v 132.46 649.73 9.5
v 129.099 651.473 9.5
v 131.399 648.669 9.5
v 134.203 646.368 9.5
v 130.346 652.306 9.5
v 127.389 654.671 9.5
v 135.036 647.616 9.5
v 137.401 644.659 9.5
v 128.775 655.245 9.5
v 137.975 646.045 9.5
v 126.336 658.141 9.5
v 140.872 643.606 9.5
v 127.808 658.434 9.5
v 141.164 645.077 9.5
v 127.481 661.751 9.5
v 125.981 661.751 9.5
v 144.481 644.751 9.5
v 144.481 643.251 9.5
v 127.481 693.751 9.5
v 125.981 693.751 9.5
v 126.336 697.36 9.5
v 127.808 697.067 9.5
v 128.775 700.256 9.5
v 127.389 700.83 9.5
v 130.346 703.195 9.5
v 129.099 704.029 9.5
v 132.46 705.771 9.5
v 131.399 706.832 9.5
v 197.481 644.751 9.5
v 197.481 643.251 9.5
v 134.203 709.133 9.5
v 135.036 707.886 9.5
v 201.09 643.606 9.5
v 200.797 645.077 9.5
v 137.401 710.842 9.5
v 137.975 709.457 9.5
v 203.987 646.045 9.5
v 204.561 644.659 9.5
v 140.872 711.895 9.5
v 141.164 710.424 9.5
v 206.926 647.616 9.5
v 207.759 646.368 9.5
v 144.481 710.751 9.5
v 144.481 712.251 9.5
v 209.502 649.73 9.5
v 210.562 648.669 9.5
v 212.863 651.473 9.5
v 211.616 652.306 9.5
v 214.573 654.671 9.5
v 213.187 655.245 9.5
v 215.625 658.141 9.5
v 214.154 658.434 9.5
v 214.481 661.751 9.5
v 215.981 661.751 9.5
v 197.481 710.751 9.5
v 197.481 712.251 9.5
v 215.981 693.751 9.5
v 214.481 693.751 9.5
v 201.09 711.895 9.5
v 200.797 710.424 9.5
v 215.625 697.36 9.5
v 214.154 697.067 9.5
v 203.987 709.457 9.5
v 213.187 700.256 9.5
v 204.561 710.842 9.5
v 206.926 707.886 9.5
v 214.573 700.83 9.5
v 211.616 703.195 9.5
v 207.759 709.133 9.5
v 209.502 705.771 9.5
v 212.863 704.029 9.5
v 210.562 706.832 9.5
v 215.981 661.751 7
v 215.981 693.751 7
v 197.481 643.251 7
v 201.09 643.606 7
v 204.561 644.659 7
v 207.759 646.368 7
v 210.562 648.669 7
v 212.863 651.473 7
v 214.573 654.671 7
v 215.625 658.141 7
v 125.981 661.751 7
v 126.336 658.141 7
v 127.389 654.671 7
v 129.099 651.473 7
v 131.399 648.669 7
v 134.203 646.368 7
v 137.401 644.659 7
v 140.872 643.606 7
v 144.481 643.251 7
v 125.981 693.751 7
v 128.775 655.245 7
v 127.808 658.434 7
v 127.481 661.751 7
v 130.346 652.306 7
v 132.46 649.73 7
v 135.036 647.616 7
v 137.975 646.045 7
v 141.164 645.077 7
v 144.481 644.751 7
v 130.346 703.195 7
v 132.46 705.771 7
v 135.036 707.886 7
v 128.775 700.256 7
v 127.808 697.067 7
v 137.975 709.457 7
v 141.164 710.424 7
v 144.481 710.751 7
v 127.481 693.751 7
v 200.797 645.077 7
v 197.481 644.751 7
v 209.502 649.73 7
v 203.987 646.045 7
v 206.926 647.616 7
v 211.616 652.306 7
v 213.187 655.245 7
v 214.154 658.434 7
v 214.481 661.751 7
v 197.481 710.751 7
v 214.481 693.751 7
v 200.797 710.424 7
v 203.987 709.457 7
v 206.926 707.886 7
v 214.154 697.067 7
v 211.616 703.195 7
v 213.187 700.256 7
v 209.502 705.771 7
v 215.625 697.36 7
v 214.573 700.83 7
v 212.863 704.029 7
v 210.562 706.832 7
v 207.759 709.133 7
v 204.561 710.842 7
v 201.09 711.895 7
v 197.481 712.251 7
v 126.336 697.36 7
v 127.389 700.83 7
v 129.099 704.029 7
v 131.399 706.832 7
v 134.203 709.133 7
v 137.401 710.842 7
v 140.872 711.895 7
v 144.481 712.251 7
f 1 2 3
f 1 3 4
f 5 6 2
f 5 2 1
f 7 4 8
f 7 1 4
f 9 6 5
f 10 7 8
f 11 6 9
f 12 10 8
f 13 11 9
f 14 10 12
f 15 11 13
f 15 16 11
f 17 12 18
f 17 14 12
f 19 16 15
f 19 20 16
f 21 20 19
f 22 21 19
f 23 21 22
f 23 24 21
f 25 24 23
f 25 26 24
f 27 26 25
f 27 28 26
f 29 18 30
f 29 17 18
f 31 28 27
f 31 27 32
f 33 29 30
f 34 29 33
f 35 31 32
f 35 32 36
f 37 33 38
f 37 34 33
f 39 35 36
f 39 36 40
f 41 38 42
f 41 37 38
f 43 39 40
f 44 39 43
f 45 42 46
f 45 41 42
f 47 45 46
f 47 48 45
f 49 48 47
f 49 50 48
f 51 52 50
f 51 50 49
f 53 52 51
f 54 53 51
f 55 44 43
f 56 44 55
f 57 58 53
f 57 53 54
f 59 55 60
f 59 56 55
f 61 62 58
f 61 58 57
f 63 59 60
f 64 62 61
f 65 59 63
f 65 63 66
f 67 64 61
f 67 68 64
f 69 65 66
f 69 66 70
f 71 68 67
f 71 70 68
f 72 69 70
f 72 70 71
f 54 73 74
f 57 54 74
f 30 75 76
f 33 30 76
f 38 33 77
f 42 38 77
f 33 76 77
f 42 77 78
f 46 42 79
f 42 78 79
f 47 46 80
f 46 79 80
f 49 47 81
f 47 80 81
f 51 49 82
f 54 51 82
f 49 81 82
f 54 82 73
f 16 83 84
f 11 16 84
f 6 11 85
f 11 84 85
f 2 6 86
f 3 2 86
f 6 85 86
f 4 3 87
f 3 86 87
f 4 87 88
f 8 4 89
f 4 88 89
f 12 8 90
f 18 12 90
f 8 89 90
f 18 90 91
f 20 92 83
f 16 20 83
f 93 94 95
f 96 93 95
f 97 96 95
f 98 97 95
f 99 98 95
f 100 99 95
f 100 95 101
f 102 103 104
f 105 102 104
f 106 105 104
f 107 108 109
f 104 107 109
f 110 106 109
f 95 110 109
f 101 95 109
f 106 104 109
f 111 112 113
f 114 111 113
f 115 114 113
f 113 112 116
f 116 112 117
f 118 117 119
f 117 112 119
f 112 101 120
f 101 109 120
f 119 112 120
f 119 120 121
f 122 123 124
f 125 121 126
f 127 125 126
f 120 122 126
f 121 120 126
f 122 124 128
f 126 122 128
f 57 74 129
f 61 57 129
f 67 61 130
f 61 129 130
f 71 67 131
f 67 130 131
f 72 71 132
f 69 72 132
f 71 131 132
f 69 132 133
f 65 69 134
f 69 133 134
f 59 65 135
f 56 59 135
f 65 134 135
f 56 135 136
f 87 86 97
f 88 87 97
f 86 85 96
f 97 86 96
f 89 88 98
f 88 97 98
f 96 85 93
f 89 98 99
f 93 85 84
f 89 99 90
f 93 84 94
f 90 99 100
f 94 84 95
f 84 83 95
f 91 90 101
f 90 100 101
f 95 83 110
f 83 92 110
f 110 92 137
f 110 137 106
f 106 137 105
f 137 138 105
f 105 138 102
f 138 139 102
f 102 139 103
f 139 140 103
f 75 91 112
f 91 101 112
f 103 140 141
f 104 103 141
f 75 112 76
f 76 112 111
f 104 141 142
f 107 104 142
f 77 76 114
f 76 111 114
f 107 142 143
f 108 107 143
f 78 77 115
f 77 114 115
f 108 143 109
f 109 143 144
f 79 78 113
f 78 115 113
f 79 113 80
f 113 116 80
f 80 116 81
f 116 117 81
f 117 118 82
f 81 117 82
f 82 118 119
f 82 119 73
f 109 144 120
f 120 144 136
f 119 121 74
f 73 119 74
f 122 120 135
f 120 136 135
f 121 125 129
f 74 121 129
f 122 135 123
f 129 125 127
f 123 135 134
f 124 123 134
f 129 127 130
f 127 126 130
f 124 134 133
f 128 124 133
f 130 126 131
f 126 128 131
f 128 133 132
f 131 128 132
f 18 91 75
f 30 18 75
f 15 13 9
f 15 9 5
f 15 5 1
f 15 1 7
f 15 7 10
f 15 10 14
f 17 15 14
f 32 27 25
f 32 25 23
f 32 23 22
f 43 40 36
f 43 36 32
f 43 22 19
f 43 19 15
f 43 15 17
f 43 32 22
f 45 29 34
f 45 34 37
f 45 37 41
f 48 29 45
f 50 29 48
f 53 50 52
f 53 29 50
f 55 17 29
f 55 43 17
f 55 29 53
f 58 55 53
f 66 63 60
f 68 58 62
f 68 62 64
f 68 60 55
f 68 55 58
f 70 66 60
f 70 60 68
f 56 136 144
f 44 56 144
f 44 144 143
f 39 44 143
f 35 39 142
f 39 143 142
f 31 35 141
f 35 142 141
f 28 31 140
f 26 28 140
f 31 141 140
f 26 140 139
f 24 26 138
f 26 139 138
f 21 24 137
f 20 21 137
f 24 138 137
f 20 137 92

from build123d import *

# Parameters (mm, degrees)
BOSS_EXTRUDE1_START = 71.584968
BOSS_EXTRUDE1_DEPTH = 2.5
BOSS_EXTRUDE2_DEPTH = 2.5


with BuildPart() as part:
    # Sketch2 → Boss-Extrude1 (new body)
    with BuildSketch(Plane.XY.offset(-64.584967839).offset(BOSS_EXTRUDE1_START)):
        with BuildLine():
            Line((144.480934022, 643.250628573), (197.480934022, 643.250628573))
            ThreePointArc((197.480934022, 643.250628573), (210.562409474, 648.669153121), (215.980934022, 661.750628573))
            Line((215.980934022, 661.750628573), (215.980934022, 693.750628573))
            ThreePointArc((215.980934022, 693.750628573), (210.562409474, 706.832104025), (197.480934022, 712.250628573))
            Line((197.480934022, 712.250628573), (144.480934022, 712.250628573))
            ThreePointArc((144.480934022, 712.250628573), (131.39945857, 706.832104025), (125.980934022, 693.750628573))
            Line((125.980934022, 693.750628573), (125.980934022, 661.750628573))
            ThreePointArc((125.980934022, 661.750628573), (131.39945857, 648.669153121), (144.480934022, 643.250628573))
        make_face()
        with BuildLine():
            Line((144.480934022, 644.750628573), (197.480934022, 644.750628573))
            ThreePointArc((197.480934022, 644.750628573), (209.501749302, 649.729813293), (214.480934022, 661.750628573))
            Line((214.480934022, 661.750628573), (214.480934022, 693.750628573))
            ThreePointArc((214.480934022, 693.750628573), (209.501749302, 705.771443853), (197.480934022, 710.750628573))
            Line((197.480934022, 710.750628573), (144.480934022, 710.750628573))
            ThreePointArc((144.480934022, 710.750628573), (132.460118742, 705.771443853), (127.480934022, 693.750628573))
            Line((127.480934022, 693.750628573), (127.480934022, 661.750628573))
            ThreePointArc((127.480934022, 661.750628573), (132.460118742, 649.729813293), (144.480934022, 644.750628573))
        make_face(mode=Mode.SUBTRACT)
    extrude(amount=BOSS_EXTRUDE1_DEPTH)

    # Sketch3 → Boss-Extrude2 (add)
    with BuildSketch(Plane.XY.offset(7)):
        with BuildLine():
            Line((125.980934022, 693.750628573), (125.980934022, 661.750628573))
            ThreePointArc((125.980934022, 661.750628573), (131.39945857, 648.669153121), (144.480934022, 643.250628573))
            Line((144.480934022, 643.250628573), (197.480934022, 643.250628573))
            ThreePointArc((197.480934022, 643.250628573), (210.562409474, 648.669153121), (215.980934022, 661.750628573))
            Line((215.980934022, 661.750628573), (215.980934022, 693.750628573))
            ThreePointArc((215.980934022, 693.750628573), (210.562409474, 706.832104025), (197.480934022, 712.250628573))
            Line((197.480934022, 712.250628573), (144.480934022, 712.250628573))
            ThreePointArc((144.480934022, 712.250628573), (131.39945857, 706.832104025), (125.980934022, 693.750628573))
        make_face()
    extrude(amount=BOSS_EXTRUDE2_DEPTH)


solid = part.part
